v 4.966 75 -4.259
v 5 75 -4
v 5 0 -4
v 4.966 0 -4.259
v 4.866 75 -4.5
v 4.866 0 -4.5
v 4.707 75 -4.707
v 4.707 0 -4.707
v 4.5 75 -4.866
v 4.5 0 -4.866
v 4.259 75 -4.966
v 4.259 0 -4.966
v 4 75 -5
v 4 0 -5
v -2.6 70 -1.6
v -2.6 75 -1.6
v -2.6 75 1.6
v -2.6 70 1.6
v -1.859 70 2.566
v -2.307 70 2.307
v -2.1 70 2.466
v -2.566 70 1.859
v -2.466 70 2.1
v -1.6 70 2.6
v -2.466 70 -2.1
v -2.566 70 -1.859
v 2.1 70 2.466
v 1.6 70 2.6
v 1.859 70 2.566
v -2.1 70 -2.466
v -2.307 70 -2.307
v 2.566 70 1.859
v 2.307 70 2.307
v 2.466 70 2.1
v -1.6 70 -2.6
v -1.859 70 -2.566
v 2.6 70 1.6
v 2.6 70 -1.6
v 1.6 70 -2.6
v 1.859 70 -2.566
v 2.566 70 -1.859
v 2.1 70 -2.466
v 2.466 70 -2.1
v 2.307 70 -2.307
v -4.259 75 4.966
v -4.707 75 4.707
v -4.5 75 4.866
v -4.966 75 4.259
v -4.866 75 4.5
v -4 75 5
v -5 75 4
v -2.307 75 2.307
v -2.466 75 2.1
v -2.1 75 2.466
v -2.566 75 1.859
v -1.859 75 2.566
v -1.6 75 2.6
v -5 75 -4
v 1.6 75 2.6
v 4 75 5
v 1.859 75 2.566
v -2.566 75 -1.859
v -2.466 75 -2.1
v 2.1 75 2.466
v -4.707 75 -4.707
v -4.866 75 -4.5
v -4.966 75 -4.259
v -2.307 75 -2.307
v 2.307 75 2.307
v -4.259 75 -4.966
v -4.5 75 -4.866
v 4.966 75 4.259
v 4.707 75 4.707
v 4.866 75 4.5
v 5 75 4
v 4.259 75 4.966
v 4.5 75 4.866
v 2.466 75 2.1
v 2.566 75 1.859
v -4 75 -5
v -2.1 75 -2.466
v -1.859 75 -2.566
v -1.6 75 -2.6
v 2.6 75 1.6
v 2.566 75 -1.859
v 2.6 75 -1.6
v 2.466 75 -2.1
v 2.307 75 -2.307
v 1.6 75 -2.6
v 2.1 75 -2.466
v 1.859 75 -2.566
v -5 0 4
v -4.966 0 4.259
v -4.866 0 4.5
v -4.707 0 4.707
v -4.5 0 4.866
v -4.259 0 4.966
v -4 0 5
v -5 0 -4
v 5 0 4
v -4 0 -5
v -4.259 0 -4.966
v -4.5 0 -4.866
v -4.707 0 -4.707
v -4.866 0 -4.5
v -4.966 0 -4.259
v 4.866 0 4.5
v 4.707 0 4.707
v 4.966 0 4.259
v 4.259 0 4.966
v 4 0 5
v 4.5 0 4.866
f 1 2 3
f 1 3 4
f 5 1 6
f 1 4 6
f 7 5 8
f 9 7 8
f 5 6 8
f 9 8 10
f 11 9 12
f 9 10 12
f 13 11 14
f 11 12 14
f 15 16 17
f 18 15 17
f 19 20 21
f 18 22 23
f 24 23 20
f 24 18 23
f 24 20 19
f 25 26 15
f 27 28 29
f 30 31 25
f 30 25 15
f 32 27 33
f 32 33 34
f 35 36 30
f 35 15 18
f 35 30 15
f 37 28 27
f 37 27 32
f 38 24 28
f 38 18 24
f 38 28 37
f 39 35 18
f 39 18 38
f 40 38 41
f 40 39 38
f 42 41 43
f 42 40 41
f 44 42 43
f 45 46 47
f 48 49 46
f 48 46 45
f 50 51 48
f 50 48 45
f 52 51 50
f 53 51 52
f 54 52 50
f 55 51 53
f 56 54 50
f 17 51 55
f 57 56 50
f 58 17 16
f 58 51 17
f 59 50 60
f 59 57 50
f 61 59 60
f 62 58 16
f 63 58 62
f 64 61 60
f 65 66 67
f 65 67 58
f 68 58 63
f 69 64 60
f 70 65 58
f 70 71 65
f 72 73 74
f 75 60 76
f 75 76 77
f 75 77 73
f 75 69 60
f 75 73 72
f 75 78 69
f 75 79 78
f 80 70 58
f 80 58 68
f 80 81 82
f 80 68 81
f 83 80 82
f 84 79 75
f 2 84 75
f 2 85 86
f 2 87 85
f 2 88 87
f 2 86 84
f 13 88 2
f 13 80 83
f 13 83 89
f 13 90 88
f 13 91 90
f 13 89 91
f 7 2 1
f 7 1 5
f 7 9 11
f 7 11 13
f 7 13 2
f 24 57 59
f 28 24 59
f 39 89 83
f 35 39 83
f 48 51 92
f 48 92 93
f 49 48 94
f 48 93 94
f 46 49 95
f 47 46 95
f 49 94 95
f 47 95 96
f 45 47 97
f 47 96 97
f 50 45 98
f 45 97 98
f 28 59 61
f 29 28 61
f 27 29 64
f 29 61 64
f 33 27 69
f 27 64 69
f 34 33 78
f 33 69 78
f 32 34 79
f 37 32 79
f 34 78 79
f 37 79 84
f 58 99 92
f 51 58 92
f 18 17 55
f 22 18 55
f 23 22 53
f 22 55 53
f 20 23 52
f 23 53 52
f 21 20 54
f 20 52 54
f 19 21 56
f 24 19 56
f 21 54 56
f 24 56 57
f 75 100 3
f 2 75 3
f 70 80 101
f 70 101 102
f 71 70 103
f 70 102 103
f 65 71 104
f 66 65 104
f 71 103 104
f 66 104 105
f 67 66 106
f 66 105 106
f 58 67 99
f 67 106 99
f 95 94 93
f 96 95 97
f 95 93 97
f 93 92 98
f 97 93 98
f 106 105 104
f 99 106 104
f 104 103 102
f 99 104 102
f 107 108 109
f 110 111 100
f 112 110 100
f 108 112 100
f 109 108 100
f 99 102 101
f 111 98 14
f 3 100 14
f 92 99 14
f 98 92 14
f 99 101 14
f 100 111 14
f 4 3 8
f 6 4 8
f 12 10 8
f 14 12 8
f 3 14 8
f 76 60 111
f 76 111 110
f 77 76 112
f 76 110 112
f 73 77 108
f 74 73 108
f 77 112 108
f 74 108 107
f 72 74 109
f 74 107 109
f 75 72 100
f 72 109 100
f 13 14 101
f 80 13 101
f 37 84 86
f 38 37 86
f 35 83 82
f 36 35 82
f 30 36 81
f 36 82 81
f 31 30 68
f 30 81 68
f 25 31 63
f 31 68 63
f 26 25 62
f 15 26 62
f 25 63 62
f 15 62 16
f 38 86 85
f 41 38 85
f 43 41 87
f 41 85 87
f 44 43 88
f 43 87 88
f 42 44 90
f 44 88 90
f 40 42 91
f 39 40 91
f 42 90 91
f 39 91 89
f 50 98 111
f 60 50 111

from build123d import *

# Parameters (mm, degrees)
EXTRUDE_1_DEPTH     = 75
CUT_EXTRUDE_1_DEPTH = 5


with BuildPart() as part:
    # ｽｹｯﾁ1 → ﾎﾞｽ - 押し出し1 (new body)
    with BuildSketch(Plane(origin=(0, 0, 0), x_dir=(1, 0, 0), z_dir=(0, 1, 0))):
        with BuildLine():
            Line((-4, -5), (4, -5))
            ThreePointArc((4, -5), (4.707106781, -4.707106781), (5, -4))
            Line((5, -4), (5, 4))
            ThreePointArc((5, 4), (4.707106781, 4.707106781), (4, 5))
            Line((4, 5), (-4, 5))
            ThreePointArc((-4, 5), (-4.707106781, 4.707106781), (-5, 4))
            Line((-5, 4), (-5, -4))
            ThreePointArc((-5, -4), (-4.707106781, -4.707106781), (-4, -5))
        make_face()
    extrude(amount=EXTRUDE_1_DEPTH)

    # ｽｹｯﾁ2 → ｶｯﾄ - 押し出し1 (cut)
    with BuildSketch(Plane(origin=(0, 75, 0), x_dir=(1, 0, 0), z_dir=(0, 1, 0))):
        with BuildLine():
            Line((-1.6, -2.6), (1.6, -2.6))
            ThreePointArc((1.6, -2.6), (2.307106781, -2.307106781), (2.6, -1.6))
            Line((2.6, -1.6), (2.6, 1.6))
            ThreePointArc((2.6, 1.6), (2.307106781, 2.307106781), (1.6, 2.6))
            Line((1.6, 2.6), (-1.6, 2.6))
            ThreePointArc((-1.6, 2.6), (-2.307106781, 2.307106781), (-2.6, 1.6))
            Line((-2.6, 1.6), (-2.6, -1.6))
            ThreePointArc((-2.6, -1.6), (-2.307106781, -2.307106781), (-1.6, -2.6))
        make_face()
    extrude(amount=-CUT_EXTRUDE_1_DEPTH, mode=Mode.SUBTRACT)


solid = part.part
